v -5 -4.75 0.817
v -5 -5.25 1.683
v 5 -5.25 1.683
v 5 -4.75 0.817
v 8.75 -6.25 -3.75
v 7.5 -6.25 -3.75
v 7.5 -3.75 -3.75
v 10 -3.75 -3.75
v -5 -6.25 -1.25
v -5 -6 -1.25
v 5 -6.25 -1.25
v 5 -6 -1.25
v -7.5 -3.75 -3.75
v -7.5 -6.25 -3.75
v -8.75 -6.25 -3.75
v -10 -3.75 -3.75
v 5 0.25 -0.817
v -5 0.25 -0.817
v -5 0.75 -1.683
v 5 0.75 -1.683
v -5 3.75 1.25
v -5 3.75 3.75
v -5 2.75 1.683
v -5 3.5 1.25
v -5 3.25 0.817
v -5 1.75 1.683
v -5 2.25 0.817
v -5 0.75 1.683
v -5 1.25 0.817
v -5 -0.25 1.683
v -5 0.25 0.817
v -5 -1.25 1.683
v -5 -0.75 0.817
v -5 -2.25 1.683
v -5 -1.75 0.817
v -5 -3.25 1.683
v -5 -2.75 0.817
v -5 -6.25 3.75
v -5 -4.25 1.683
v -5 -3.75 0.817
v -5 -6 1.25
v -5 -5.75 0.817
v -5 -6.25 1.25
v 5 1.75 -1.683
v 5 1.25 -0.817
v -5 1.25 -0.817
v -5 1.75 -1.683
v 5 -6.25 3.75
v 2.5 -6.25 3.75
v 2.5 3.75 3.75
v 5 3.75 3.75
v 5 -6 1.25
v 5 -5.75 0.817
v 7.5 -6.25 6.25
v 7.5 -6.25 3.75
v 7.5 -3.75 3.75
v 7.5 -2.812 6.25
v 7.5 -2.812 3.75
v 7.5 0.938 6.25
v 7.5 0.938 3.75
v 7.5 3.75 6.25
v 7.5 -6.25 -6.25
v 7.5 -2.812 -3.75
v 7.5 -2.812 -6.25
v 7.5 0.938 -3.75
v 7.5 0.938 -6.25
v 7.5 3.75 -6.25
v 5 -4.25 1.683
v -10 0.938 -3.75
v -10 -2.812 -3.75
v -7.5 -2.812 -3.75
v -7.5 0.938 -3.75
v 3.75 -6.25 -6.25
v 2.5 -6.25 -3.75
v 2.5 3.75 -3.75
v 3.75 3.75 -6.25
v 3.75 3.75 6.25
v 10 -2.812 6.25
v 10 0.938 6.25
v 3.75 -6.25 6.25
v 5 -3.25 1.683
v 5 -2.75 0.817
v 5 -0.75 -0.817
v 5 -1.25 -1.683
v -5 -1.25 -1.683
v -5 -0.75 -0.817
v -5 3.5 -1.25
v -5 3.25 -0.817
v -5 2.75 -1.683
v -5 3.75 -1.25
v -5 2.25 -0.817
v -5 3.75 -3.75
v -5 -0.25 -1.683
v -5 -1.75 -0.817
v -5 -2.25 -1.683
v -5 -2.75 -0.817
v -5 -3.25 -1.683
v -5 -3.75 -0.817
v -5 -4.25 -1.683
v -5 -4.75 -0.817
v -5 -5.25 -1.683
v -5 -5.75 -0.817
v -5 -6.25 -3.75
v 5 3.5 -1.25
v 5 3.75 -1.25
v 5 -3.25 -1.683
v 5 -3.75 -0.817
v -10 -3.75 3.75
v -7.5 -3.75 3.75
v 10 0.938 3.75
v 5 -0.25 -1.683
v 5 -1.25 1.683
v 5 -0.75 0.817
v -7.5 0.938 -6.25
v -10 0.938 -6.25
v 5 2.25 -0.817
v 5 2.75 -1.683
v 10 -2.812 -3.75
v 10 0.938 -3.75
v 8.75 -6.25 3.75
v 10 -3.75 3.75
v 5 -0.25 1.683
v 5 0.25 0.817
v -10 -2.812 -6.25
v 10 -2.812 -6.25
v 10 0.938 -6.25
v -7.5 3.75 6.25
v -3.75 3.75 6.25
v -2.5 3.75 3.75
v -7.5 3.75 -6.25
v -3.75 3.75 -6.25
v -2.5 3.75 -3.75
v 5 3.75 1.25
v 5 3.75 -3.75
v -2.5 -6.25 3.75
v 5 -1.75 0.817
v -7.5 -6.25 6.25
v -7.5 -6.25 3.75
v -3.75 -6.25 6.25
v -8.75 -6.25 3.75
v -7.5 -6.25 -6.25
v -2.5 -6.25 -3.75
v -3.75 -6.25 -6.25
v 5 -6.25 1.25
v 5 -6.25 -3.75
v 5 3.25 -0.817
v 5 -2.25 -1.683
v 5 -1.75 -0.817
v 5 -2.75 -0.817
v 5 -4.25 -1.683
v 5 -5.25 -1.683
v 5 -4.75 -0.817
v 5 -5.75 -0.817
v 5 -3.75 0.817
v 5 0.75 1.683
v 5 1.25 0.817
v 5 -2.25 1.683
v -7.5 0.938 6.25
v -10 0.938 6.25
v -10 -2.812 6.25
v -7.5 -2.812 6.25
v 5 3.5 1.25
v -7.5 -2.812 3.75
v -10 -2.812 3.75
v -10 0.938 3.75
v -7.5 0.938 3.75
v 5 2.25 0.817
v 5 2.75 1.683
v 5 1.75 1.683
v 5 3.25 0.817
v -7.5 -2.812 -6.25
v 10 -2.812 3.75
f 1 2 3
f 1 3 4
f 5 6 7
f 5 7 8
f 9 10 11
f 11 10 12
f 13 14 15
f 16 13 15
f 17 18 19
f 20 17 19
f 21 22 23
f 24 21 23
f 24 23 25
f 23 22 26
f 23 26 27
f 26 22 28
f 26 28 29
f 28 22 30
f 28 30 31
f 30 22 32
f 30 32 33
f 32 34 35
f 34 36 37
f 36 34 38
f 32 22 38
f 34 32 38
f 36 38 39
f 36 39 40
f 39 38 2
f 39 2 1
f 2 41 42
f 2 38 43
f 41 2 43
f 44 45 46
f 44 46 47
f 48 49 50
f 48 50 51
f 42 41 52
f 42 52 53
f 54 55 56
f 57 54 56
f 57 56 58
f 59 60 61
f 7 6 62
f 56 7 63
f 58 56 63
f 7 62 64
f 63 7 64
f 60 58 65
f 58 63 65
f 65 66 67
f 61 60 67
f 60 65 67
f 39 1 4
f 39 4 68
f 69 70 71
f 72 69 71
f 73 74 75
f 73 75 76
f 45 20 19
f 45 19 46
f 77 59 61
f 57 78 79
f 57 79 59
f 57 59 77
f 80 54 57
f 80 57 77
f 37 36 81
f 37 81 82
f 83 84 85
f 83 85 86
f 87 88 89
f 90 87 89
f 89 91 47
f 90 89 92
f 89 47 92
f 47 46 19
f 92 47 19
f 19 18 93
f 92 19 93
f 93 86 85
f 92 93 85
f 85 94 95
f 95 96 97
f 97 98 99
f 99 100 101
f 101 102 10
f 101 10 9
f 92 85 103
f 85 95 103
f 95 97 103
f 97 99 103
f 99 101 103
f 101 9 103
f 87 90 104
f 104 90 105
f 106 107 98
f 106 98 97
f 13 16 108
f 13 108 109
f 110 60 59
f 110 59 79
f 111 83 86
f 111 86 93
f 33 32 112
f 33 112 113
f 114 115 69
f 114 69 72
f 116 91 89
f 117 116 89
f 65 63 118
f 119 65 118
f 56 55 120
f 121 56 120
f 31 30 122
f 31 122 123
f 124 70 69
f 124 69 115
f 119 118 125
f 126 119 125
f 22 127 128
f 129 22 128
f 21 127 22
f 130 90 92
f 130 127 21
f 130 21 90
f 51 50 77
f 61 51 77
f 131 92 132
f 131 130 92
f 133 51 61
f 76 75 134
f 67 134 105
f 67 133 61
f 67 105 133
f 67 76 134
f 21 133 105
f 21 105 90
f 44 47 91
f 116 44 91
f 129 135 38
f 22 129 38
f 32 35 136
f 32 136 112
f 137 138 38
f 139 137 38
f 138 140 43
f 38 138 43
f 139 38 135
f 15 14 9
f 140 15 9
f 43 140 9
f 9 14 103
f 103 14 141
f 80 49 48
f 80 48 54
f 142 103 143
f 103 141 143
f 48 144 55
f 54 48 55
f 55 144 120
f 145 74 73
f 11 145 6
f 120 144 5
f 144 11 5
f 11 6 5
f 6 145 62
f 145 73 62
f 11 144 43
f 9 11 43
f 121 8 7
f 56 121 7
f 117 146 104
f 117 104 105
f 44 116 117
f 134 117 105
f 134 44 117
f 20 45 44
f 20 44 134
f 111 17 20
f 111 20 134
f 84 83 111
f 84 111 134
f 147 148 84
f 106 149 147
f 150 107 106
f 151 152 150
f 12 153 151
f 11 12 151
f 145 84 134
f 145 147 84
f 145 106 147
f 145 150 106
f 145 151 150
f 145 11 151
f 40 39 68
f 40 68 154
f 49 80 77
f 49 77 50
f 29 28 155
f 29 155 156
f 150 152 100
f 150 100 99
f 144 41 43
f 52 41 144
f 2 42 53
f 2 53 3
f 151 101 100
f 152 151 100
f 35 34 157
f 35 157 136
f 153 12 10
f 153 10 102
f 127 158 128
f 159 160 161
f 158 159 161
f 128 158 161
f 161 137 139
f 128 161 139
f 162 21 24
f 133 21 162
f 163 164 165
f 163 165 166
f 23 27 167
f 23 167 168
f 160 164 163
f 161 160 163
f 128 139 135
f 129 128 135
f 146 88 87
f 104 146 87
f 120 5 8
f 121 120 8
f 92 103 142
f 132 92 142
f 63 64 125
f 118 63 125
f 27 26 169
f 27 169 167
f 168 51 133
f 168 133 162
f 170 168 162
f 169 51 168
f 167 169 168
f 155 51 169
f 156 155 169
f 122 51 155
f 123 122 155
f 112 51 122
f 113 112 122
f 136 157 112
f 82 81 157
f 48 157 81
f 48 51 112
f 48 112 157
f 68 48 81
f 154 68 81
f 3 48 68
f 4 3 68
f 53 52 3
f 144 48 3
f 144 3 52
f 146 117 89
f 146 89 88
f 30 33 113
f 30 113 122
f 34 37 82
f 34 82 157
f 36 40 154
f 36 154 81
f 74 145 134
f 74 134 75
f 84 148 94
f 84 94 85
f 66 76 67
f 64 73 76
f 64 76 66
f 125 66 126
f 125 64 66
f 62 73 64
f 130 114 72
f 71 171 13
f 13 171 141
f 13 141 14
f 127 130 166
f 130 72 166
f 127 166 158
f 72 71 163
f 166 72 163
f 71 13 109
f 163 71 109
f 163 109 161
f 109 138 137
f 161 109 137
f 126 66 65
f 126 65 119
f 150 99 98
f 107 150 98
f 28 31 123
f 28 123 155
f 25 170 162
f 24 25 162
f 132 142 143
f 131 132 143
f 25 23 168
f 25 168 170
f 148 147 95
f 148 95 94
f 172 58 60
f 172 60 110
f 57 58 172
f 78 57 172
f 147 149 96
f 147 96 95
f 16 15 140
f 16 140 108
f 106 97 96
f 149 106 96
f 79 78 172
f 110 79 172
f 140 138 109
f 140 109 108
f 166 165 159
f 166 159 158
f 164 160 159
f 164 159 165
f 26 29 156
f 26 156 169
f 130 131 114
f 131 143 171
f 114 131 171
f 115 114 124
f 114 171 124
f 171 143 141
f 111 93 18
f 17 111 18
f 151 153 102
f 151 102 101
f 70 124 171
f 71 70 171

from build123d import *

# Parameters (mm, degrees)
BOSS_EXTRUDE1_DEPTH      = 1.25
BOSS_EXTRUDE1_DEPTH_BACK = 1.25
CUT_EXTRUDE1_DEPTH       = 10.842509843
CUT_EXTRUDE1_DEPTH_BACK  = 10.842509843
BOSS_EXTRUDE4_DEPTH      = 5
BOSS_EXTRUDE4_DEPTH_BACK = 5
BOSS_EXTRUDE2_DEPTH      = 3.75
BOSS_EXTRUDE2_DEPTH_BACK = 6.25
BOSS_EXTRUDE3_DEPTH      = 3.75
BOSS_EXTRUDE3_DEPTH_BACK = 3.75
BOSS_EXTRUDE5_DEPTH      = 0.9375
BOSS_EXTRUDE5_DEPTH_BACK = 2.8125
SKETCH6_W                = 2.5
SKETCH6_H                = 2.5


with BuildPart() as part:
    # Sketch1 → Boss-Extrude1 (new, two sides: drawn at the far end of the back side and taken through both)
    with BuildSketch(Plane.XY.offset(-BOSS_EXTRUDE1_DEPTH_BACK)):
        Polygon((-7.5, -3.75), (-7.5, -6.25), (7.5, -6.25), (7.5, -3.75), (7.5, 3.75), (-7.5, 3.75), align=None)
    extrude(amount=BOSS_EXTRUDE1_DEPTH + BOSS_EXTRUDE1_DEPTH_BACK)

    # Sketch4 → Cut-Extrude1 (cut, two sides: drawn at the far end of the back side and taken through both)
    with BuildSketch(Plane(origin=(0, 0, 0), x_dir=(0, 0, -1), z_dir=(1, 0, 0)).offset(-CUT_EXTRUDE1_DEPTH_BACK)):
        Polygon((-0.816987298, 3.25), (-1.466506351, 3.625), (-1.466506351, 2.875), align=None)
        Polygon((-1.466506351, 1.875), (-0.816987298, 2.25), (-1.466506351, 2.625), align=None)
        Polygon((-1.466506351, 0.875), (-0.816987298, 1.25), (-1.466506351, 1.625), align=None)
        Polygon((-1.466506351, -0.125), (-0.816987298, 0.25), (-1.466506351, 0.625), align=None)
        Polygon((-1.466506351, -1.125), (-0.816987298, -0.75), (-1.466506351, -0.375), align=None)
        Polygon((-1.466506351, -2.125), (-0.816987298, -1.75), (-1.466506351, -1.375), align=None)
        Polygon((-1.466506351, -3.125), (-0.816987298, -2.75), (-1.466506351, -2.375), align=None)
        Polygon((-1.466506351, -4.125), (-0.816987298, -3.75), (-1.466506351, -3.375), align=None)
        Polygon((-1.466506351, -5.125), (-0.816987298, -4.75), (-1.466506351, -4.375), align=None)
        Polygon((-1.466506351, -6.125), (-0.816987298, -5.75), (-1.466506351, -5.375), align=None)
        Polygon((1.466506351, -5.375), (1.466506351, -6.125), (0.816987298, -5.75), align=None)
        Polygon((1.466506351, -4.375), (1.466506351, -5.125), (0.816987298, -4.75), align=None)
        Polygon((1.466506351, -3.375), (1.466506351, -4.125), (0.816987298, -3.75), align=None)
        Polygon((1.466506351, -2.375), (1.466506351, -3.125), (0.816987298, -2.75), align=None)
        Polygon((1.466506351, -1.375), (1.466506351, -2.125), (0.816987298, -1.75), align=None)
        Polygon((1.466506351, -0.375), (1.466506351, -1.125), (0.816987298, -0.75), align=None)
        Polygon((1.466506351, 0.625), (1.466506351, -0.125), (0.816987298, 0.25), align=None)
        Polygon((1.466506351, 1.625), (1.466506351, 0.875), (0.816987298, 1.25), align=None)
        Polygon((1.466506351, 2.625), (1.466506351, 1.875), (0.816987298, 2.25), align=None)
        Polygon((1.466506351, 2.875), (0.816987298, 3.25), (1.466506351, 3.625), align=None)
    extrude(amount=CUT_EXTRUDE1_DEPTH + CUT_EXTRUDE1_DEPTH_BACK, mode=Mode.SUBTRACT)

    # Sketch5 → Boss-Extrude4 (add, two sides: drawn at the far end of the back side and taken through both)
    with BuildSketch(Plane(origin=(0, 0, 0), x_dir=(0, 0, -1), z_dir=(1, 0, 0)).offset(-BOSS_EXTRUDE4_DEPTH_BACK)):
        Polygon((1.683012702, 2.75), (1.033493649, 3.125), (1.033493649, 2.375), align=None)
        Polygon((1.033493649, 1.375), (1.683012702, 1.75), (1.033493649, 2.125), align=None)
        Polygon((1.033493649, 0.375), (1.683012702, 0.75), (1.033493649, 1.125), align=None)
        Polygon((1.033493649, -0.625), (1.683012702, -0.25), (1.033493649, 0.125), align=None)
        Polygon((1.033493649, -1.625), (1.683012702, -1.25), (1.033493649, -0.875), align=None)
        Polygon((1.033493649, -2.625), (1.683012702, -2.25), (1.033493649, -1.875), align=None)
        Polygon((1.033493649, -3.625), (1.683012702, -3.25), (1.033493649, -2.875), align=None)
        Polygon((1.033493649, -4.625), (1.683012702, -4.25), (1.033493649, -3.875), align=None)
        Polygon((1.033493649, -5.625), (1.683012702, -5.25), (1.033493649, -4.875), align=None)
        Polygon((-1.033493649, -4.875), (-1.033493649, -5.625), (-1.683012702, -5.25), align=None)
        Polygon((-1.033493649, -3.875), (-1.033493649, -4.625), (-1.683012702, -4.25), align=None)
        Polygon((-1.033493649, -2.875), (-1.033493649, -3.625), (-1.683012702, -3.25), align=None)
        Polygon((-1.033493649, -1.875), (-1.033493649, -2.625), (-1.683012702, -2.25), align=None)
        Polygon((-1.033493649, -0.875), (-1.033493649, -1.625), (-1.683012702, -1.25), align=None)
        Polygon((-1.033493649, 0.125), (-1.033493649, -0.625), (-1.683012702, -0.25), align=None)
        Polygon((-1.033493649, 1.125), (-1.033493649, 0.375), (-1.683012702, 0.75), align=None)
        Polygon((-1.033493649, 2.125), (-1.033493649, 1.375), (-1.683012702, 1.75), align=None)
        Polygon((-1.033493649, 2.375), (-1.683012702, 2.75), (-1.033493649, 3.125), align=None)
    extrude(amount=BOSS_EXTRUDE4_DEPTH + BOSS_EXTRUDE4_DEPTH_BACK)

    # Sketch2 → Boss-Extrude2 (add, two sides: drawn at the far end of the back side and taken through both)
    with BuildSketch(Plane(origin=(0, 0, 0), x_dir=(1, 0, 0), z_dir=(0, 1, 0)).offset(-BOSS_EXTRUDE2_DEPTH_BACK)):
        Polygon((-7.5, -6.25), (-3.75, -6.25), (-2.5, -3.75), (-5, -3.75), (-5, 3.75), (-2.5, 3.75), (-3.75, 6.25), (-7.5, 6.25), align=None)
        Polygon((7.5, -6.25), (3.75, -6.25), (2.5, -3.75), (5, -3.75), (5, 3.75), (2.5, 3.75), (3.75, 6.25), (7.5, 6.25), align=None)
    extrude(amount=BOSS_EXTRUDE2_DEPTH + BOSS_EXTRUDE2_DEPTH_BACK)

    # Sketch3 → Boss-Extrude3 (add, two sides: drawn at the far end of the back side and taken through both)
    with BuildSketch(Plane.XY.offset(-BOSS_EXTRUDE3_DEPTH_BACK)):
        Polygon((-6.25, -6.25), (-8.75, -6.25), (-10, -3.75), (-6.25, -3.75), align=None)
        Polygon((6.25, -6.25), (8.75, -6.25), (10, -3.75), (6.25, -3.75), align=None)
    extrude(amount=BOSS_EXTRUDE3_DEPTH + BOSS_EXTRUDE3_DEPTH_BACK)

    # Sketch6 → Boss-Extrude5 (add, two sides: drawn at the far end of the back side and taken through both)
    with BuildSketch(Plane(origin=(0, 0, 0), x_dir=(1, 0, 0), z_dir=(0, 1, 0)).offset(-BOSS_EXTRUDE5_DEPTH_BACK)):
        with Locations((-8.75, -5)):
            Rectangle(SKETCH6_W, SKETCH6_H)
        with Locations((-8.75, 5)):
            Rectangle(SKETCH6_W, SKETCH6_H)
        with Locations((8.75, 5)):
            Rectangle(SKETCH6_W, SKETCH6_H)
        with Locations((8.75, -5)):
            Rectangle(SKETCH6_W, SKETCH6_H)
    extrude(amount=BOSS_EXTRUDE5_DEPTH + BOSS_EXTRUDE5_DEPTH_BACK)


solid = part.part
